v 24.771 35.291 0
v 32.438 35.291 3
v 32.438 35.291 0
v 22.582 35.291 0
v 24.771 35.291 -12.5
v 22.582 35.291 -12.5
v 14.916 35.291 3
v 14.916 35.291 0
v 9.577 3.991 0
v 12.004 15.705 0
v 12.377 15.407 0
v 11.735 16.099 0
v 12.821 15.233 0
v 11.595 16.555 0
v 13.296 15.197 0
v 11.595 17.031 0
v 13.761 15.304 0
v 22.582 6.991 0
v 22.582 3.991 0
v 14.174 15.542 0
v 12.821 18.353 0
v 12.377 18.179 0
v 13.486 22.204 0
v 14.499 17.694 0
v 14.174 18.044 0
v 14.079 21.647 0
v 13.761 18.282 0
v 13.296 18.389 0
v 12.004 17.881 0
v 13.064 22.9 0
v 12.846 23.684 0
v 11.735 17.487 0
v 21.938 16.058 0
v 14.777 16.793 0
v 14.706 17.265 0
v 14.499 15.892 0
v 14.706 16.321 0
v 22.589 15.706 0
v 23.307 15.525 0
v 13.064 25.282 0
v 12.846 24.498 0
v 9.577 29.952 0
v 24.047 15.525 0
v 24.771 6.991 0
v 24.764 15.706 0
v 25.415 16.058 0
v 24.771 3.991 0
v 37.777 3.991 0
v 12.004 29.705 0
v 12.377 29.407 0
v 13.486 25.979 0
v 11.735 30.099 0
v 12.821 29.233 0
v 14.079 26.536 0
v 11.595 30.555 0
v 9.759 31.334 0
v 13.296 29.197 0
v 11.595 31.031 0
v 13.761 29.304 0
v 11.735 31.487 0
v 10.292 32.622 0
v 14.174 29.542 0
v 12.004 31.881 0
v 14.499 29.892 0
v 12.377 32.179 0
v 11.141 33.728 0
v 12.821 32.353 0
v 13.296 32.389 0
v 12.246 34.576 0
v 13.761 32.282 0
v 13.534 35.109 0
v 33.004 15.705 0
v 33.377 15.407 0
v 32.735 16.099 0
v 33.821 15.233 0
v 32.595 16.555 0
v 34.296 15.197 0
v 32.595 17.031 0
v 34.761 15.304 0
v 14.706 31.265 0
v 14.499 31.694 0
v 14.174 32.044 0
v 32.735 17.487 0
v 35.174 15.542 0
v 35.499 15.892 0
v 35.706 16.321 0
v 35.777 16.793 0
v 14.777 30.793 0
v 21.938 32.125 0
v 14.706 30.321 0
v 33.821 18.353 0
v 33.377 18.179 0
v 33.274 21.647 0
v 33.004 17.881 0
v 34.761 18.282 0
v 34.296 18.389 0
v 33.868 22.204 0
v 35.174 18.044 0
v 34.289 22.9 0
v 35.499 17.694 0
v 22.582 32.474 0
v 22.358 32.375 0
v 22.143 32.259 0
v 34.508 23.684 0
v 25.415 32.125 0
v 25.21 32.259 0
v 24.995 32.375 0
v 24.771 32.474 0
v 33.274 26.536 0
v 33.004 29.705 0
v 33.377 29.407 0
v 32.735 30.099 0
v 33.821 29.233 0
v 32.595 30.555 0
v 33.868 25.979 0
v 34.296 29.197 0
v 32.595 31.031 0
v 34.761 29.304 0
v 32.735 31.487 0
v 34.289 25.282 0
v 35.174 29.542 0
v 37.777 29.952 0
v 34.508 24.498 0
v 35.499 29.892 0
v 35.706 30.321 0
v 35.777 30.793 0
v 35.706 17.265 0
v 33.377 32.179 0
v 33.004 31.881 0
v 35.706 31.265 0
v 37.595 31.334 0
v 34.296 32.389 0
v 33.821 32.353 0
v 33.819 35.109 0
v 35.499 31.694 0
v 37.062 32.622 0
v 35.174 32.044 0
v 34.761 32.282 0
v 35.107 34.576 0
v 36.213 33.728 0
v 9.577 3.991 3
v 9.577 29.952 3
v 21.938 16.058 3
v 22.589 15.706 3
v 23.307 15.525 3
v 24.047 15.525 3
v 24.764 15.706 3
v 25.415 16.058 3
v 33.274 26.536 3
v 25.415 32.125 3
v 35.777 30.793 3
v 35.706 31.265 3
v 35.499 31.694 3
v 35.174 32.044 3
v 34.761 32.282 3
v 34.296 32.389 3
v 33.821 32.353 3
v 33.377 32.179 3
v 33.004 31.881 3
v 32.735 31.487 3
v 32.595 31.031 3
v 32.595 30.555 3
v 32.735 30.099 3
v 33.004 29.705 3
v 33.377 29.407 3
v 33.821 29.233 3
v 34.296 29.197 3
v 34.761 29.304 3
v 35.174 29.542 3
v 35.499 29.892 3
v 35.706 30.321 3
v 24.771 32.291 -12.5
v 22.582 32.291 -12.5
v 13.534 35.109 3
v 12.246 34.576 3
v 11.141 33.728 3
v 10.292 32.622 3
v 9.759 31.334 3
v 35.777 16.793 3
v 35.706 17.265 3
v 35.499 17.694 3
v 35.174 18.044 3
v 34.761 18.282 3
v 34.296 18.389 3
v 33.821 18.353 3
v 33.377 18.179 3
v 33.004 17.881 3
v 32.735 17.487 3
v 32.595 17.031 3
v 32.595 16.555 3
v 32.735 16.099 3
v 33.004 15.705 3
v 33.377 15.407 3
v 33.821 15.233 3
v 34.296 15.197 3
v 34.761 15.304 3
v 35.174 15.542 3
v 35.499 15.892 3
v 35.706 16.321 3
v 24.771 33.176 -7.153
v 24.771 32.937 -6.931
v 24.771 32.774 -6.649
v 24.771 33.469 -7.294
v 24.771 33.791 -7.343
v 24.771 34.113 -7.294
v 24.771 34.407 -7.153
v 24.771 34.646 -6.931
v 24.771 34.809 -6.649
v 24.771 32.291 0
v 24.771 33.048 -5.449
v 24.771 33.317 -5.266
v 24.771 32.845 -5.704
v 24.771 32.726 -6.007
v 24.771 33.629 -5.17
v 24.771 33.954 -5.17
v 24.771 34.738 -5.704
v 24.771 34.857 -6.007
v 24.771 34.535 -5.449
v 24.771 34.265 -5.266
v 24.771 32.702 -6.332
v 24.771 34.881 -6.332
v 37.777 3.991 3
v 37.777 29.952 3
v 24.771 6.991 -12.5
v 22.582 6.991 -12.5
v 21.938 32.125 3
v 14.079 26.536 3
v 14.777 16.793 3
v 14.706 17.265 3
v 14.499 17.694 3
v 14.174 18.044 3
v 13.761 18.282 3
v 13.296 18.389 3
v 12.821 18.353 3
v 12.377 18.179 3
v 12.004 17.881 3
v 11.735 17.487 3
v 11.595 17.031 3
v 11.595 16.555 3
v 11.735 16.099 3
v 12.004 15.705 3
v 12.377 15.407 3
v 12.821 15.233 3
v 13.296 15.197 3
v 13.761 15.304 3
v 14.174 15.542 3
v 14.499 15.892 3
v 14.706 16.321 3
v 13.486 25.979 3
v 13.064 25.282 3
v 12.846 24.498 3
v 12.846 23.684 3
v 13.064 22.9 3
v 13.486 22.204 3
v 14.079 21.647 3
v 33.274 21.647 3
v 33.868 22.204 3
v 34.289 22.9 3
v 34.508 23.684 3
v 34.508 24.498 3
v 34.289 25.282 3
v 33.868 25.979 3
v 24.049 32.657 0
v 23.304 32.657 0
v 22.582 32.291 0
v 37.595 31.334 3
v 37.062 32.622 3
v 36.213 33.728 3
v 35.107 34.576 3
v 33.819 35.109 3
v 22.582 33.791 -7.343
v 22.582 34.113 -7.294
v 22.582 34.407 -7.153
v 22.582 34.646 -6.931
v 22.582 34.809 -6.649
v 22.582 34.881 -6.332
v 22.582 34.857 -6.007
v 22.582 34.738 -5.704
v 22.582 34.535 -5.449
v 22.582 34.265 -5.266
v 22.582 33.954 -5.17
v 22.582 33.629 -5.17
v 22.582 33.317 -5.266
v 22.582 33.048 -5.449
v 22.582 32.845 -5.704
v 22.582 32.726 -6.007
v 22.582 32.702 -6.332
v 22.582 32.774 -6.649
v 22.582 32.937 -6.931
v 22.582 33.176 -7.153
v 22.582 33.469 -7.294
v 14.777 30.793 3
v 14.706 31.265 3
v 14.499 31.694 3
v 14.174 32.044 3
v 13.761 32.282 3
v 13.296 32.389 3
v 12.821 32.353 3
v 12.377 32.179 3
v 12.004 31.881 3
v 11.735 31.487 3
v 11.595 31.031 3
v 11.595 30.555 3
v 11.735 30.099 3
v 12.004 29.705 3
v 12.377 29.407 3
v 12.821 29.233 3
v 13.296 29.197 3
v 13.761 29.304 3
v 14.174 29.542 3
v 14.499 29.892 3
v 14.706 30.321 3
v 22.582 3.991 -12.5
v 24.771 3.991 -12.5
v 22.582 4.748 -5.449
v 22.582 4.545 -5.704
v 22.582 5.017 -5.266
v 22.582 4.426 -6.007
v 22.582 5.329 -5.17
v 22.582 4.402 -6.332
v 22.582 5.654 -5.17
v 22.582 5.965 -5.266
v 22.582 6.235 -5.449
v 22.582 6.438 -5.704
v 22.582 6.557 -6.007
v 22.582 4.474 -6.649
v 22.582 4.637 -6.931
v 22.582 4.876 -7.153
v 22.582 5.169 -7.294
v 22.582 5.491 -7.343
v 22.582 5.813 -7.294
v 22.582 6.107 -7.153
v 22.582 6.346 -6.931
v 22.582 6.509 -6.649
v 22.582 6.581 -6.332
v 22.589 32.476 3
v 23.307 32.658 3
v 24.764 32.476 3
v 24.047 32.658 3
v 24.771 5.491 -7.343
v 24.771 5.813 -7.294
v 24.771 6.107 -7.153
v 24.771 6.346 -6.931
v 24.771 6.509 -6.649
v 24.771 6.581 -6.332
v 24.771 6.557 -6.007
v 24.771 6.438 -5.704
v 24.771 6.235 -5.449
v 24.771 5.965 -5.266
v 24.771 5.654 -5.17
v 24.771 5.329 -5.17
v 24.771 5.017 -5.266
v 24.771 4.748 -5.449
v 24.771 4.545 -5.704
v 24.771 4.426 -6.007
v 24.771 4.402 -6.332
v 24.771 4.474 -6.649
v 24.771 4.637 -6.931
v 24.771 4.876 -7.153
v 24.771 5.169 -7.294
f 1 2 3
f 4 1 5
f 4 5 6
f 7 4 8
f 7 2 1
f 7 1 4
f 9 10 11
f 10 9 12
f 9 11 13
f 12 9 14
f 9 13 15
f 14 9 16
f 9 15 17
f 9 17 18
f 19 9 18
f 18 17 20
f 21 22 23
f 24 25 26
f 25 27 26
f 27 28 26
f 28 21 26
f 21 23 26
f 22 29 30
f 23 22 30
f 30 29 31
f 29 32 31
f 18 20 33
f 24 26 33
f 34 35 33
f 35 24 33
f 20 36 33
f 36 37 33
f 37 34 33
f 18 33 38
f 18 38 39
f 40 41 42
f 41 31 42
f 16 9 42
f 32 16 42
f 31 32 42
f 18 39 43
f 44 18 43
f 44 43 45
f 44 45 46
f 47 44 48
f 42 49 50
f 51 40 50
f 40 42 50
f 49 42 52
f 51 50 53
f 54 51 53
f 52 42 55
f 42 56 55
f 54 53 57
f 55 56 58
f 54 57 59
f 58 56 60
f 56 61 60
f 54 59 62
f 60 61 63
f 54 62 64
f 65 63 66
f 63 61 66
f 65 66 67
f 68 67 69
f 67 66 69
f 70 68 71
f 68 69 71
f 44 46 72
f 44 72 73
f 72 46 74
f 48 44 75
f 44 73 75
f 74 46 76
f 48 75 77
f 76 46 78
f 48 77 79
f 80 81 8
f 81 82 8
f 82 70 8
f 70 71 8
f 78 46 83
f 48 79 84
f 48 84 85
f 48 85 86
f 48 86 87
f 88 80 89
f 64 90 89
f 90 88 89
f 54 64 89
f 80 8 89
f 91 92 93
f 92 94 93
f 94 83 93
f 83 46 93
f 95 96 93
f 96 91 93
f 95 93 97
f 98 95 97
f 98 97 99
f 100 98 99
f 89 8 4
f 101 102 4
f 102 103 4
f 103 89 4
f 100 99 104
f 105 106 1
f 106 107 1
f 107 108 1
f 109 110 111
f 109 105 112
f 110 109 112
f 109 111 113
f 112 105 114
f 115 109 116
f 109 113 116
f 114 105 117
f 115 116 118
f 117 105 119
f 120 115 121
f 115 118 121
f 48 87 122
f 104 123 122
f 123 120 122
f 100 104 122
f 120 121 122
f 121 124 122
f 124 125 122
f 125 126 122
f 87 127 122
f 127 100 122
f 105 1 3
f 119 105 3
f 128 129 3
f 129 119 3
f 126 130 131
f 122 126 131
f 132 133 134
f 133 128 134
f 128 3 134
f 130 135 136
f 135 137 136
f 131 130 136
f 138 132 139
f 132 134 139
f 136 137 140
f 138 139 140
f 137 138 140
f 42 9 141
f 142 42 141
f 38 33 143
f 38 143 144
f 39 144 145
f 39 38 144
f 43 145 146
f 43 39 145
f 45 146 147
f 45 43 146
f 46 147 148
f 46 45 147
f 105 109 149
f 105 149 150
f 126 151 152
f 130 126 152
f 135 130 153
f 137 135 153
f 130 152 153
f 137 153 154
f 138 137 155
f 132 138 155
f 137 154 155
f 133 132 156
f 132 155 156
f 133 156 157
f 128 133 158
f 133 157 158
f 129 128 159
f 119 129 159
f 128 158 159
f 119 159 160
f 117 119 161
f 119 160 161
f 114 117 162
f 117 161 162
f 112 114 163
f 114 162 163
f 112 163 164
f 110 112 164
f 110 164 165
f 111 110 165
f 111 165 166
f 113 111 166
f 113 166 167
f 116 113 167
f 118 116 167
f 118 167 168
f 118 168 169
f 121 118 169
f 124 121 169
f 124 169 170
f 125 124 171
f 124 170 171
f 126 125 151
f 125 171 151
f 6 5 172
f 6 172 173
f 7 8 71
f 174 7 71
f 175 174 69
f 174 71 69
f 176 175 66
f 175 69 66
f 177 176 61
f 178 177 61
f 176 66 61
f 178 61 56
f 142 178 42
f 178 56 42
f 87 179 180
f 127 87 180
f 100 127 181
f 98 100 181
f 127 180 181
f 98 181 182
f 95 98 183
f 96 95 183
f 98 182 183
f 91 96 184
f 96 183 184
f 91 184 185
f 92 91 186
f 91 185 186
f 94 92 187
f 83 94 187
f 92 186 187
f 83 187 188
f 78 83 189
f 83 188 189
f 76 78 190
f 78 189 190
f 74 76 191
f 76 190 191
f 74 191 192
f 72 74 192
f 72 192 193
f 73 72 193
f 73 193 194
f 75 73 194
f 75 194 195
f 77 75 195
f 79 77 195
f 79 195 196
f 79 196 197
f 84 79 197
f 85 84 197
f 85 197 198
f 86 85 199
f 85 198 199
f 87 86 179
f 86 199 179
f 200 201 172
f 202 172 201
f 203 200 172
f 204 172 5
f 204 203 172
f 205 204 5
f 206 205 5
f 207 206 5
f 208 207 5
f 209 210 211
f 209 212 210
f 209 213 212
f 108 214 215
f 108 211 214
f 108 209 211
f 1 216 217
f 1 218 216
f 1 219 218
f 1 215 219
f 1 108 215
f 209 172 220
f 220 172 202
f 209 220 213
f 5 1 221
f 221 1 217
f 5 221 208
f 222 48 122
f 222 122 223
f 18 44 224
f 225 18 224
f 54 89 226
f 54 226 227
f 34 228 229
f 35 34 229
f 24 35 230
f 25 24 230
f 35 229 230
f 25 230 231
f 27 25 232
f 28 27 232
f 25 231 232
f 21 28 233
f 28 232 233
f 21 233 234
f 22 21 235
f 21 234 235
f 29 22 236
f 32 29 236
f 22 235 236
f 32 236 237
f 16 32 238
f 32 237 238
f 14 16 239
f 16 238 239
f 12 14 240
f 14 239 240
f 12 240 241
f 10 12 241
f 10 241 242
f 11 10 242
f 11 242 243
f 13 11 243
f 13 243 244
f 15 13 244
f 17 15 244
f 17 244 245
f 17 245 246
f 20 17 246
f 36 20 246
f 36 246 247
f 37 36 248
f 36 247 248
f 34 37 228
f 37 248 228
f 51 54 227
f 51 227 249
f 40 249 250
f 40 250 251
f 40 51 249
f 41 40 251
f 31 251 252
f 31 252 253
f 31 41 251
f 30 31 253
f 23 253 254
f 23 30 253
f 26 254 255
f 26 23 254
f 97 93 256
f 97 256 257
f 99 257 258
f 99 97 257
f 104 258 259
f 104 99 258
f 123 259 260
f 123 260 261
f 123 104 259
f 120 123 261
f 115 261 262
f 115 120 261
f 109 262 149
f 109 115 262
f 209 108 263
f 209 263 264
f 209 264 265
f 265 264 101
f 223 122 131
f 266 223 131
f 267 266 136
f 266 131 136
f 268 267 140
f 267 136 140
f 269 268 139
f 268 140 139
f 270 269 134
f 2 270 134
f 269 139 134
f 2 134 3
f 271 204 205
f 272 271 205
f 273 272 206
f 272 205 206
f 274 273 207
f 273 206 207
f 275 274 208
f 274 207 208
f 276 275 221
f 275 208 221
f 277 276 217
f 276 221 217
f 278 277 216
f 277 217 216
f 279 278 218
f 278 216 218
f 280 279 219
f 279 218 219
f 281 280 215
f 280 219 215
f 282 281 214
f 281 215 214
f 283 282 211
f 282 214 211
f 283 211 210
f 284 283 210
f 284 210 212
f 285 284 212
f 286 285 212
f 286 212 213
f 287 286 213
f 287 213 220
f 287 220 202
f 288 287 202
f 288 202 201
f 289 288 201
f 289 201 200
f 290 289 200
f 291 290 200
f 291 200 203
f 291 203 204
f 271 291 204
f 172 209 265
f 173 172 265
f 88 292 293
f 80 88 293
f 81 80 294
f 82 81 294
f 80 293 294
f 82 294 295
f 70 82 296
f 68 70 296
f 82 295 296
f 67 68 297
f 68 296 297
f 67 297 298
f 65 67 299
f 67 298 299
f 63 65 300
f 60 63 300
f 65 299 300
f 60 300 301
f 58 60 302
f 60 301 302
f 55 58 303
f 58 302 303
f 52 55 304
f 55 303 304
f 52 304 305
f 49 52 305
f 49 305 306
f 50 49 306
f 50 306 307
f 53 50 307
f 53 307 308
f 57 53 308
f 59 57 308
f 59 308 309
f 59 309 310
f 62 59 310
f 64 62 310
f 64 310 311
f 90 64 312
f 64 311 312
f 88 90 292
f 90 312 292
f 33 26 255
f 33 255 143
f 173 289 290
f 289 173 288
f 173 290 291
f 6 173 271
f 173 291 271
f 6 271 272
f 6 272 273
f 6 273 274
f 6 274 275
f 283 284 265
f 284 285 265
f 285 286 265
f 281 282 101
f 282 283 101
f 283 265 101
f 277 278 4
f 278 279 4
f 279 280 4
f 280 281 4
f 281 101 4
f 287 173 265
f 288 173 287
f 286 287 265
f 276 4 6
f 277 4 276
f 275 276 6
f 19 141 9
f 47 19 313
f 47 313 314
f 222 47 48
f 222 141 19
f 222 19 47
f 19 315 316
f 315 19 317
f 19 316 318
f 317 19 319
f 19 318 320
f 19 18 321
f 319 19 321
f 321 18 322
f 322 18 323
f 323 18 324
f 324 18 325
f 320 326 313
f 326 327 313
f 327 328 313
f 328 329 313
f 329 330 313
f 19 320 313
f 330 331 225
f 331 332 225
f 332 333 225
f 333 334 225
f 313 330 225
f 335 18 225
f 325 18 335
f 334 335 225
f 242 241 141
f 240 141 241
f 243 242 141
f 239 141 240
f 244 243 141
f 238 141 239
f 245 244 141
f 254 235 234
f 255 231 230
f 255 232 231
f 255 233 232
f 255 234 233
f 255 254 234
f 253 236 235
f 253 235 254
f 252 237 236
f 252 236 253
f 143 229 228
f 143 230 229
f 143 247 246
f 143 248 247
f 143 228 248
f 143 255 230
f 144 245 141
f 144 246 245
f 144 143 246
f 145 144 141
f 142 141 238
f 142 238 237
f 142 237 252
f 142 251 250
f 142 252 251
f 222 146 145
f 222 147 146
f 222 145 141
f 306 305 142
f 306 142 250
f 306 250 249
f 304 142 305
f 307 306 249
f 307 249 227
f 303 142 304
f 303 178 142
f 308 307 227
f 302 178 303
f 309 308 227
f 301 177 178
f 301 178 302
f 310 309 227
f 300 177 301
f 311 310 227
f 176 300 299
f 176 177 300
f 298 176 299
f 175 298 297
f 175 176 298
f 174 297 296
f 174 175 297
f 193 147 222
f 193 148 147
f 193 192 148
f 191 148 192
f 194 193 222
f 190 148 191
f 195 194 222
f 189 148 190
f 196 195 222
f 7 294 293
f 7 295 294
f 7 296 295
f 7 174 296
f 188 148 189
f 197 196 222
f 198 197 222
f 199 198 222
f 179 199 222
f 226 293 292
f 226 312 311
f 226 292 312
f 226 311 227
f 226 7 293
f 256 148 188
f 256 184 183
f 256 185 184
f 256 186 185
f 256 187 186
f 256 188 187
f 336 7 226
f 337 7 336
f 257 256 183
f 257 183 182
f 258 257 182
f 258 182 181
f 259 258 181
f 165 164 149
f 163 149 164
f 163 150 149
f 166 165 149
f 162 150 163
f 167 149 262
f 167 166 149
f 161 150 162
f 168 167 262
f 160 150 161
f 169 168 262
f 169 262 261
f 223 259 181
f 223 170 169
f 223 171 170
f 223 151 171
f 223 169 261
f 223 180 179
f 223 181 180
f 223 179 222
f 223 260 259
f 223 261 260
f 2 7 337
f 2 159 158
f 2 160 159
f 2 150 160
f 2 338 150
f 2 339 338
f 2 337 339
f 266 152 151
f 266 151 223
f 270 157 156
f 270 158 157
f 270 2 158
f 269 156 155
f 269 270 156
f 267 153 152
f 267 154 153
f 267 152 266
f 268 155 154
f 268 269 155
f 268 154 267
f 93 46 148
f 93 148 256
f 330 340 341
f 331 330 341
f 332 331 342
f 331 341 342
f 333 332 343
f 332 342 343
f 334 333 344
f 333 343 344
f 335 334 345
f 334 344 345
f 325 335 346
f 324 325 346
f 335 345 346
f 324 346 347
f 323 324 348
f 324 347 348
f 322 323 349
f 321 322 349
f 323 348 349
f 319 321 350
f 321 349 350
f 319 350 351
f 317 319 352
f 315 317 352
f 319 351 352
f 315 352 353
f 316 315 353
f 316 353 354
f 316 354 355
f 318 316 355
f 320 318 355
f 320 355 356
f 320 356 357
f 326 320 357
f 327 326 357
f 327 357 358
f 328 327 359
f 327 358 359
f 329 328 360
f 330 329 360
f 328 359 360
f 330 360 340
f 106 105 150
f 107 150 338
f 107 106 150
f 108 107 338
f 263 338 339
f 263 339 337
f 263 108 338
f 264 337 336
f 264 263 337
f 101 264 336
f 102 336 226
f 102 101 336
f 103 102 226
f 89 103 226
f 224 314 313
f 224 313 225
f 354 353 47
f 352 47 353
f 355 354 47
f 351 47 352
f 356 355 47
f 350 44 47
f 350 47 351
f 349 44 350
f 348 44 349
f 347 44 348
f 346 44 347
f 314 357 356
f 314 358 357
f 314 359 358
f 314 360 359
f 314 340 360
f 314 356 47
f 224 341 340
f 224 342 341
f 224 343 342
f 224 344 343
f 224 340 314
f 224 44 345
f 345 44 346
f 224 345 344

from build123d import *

# Parameters (mm, degrees)
BOSS_EXTRUDE1_DEPTH = 3
SKETCH2_R           = 1.6
CUT_EXTRUDE1_DEPTH  = 3
SKETCH3_W           = 2.188746234
SKETCH3_H           = 3
BOSS_EXTRUDE2_DEPTH = 12.5
SKETCH4_R           = 1.0926154
CUT_EXTRUDE2_DEPTH  = 12.5
SKETCH5_W           = 12.5
SKETCH5_H           = 3
SKETCH5_R           = 1.0926154
BOSS_EXTRUDE3_DEPTH = 2.188746233
SKETCH6_W           = 28.2
SKETCH6_H           = 3
BOSS_EXTRUDE4_DEPTH = 8.9


with BuildPart() as part:
    # Sketch1 → Boss-Extrude1 (new body)
    with BuildSketch(Plane.XY):
        with BuildLine():
            Line((9.576829353, 12.891428571), (37.776829353, 12.891428571))
            Line((37.776829353, 12.891428571), (37.776829353, 29.952191633))
            ThreePointArc((37.776829353, 29.952191633), (36.21300306, 33.727602279), (32.437592415, 35.291428571))
            Line((32.437592415, 35.291428571), (14.916066291, 35.291428571))
            ThreePointArc((14.916066291, 35.291428571), (11.140655646, 33.727602279), (9.576829353, 29.952191633))
            Line((9.576829353, 29.952191633), (9.576829353, 12.891428571))
        make_face()
        with BuildLine():
            Line((14.079239539, 21.646631976), (21.938160435, 16.057593806))
            ThreePointArc((21.938160435, 16.057593806), (23.676829353, 15.502390402), (25.415498271, 16.057593806))
            Line((25.415498271, 16.057593806), (33.274419167, 21.646631976))
            ThreePointArc((33.274419167, 21.646631976), (34.53575025, 24.091428571), (33.274419167, 26.536225167))
            Line((33.274419167, 26.536225167), (25.415498271, 32.125263337))
            ThreePointArc((25.415498271, 32.125263337), (23.676829353, 32.680466741), (21.938160435, 32.125263337))
            Line((21.938160435, 32.125263337), (14.079239539, 26.536225167))
            ThreePointArc((14.079239539, 26.536225167), (12.817908456, 24.091428571), (14.079239539, 21.646631976))
        make_face(mode=Mode.SUBTRACT)
    extrude(amount=BOSS_EXTRUDE1_DEPTH)

    # Sketch2 → Cut-Extrude1 (cut)
    with BuildSketch(Plane.XY.offset(3)):
        with Locations((13.176829353, 30.793016236)):
            Circle(SKETCH2_R)
        with Locations((34.176829353, 30.793016236)):
            Circle(SKETCH2_R)
        with Locations((13.176829353, 16.793016236)):
            Circle(SKETCH2_R)
        with Locations((34.176829353, 16.793016236)):
            Circle(SKETCH2_R)
    extrude(amount=-CUT_EXTRUDE1_DEPTH, mode=Mode.SUBTRACT)

    # Sketch3 → Boss-Extrude2 (add)
    with BuildSketch(Plane(origin=(0, 0, 0), x_dir=(-1, 0, 0), z_dir=(0, 0, -1))):
        with Locations((-23.676829353, 33.791428571)):
            Rectangle(SKETCH3_W, SKETCH3_H)
    extrude(amount=BOSS_EXTRUDE2_DEPTH)

    # Sketch4 → Cut-Extrude2 (cut)
    with BuildSketch(Plane(origin=(24.77120247, 0, 0), x_dir=(0, 0, -1), z_dir=(1, 0, 0))):
        with Locations((6.25, 33.791428571)):
            Circle(SKETCH4_R)
    extrude(amount=-CUT_EXTRUDE2_DEPTH, mode=Mode.SUBTRACT)



with BuildPart() as body_2:
    # Sketch5 → Boss-Extrude3 (new body)
    with BuildSketch(Plane(origin=(24.77120247, 0, 0), x_dir=(0, 0, -1), z_dir=(1, 0, 0))):
        with Locations((6.25, 5.491428571)):
            Rectangle(SKETCH5_W, SKETCH5_H)
        with Locations((6.25, 5.491428571)):
            Circle(SKETCH5_R, mode=Mode.SUBTRACT)
    extrude(amount=-BOSS_EXTRUDE3_DEPTH)


with BuildPart() as part_1:
    add(part.part)

    add(body_2.part)  # Boss-Extrude4 merges body 2
    # Sketch6 → Boss-Extrude4 (add)
    with BuildSketch(Plane.XZ.offset(-12.891428571)):
        with Locations((23.676829353, 1.5)):
            Rectangle(SKETCH6_W, SKETCH6_H)
    extrude(amount=BOSS_EXTRUDE4_DEPTH)


solid = part_1.part
